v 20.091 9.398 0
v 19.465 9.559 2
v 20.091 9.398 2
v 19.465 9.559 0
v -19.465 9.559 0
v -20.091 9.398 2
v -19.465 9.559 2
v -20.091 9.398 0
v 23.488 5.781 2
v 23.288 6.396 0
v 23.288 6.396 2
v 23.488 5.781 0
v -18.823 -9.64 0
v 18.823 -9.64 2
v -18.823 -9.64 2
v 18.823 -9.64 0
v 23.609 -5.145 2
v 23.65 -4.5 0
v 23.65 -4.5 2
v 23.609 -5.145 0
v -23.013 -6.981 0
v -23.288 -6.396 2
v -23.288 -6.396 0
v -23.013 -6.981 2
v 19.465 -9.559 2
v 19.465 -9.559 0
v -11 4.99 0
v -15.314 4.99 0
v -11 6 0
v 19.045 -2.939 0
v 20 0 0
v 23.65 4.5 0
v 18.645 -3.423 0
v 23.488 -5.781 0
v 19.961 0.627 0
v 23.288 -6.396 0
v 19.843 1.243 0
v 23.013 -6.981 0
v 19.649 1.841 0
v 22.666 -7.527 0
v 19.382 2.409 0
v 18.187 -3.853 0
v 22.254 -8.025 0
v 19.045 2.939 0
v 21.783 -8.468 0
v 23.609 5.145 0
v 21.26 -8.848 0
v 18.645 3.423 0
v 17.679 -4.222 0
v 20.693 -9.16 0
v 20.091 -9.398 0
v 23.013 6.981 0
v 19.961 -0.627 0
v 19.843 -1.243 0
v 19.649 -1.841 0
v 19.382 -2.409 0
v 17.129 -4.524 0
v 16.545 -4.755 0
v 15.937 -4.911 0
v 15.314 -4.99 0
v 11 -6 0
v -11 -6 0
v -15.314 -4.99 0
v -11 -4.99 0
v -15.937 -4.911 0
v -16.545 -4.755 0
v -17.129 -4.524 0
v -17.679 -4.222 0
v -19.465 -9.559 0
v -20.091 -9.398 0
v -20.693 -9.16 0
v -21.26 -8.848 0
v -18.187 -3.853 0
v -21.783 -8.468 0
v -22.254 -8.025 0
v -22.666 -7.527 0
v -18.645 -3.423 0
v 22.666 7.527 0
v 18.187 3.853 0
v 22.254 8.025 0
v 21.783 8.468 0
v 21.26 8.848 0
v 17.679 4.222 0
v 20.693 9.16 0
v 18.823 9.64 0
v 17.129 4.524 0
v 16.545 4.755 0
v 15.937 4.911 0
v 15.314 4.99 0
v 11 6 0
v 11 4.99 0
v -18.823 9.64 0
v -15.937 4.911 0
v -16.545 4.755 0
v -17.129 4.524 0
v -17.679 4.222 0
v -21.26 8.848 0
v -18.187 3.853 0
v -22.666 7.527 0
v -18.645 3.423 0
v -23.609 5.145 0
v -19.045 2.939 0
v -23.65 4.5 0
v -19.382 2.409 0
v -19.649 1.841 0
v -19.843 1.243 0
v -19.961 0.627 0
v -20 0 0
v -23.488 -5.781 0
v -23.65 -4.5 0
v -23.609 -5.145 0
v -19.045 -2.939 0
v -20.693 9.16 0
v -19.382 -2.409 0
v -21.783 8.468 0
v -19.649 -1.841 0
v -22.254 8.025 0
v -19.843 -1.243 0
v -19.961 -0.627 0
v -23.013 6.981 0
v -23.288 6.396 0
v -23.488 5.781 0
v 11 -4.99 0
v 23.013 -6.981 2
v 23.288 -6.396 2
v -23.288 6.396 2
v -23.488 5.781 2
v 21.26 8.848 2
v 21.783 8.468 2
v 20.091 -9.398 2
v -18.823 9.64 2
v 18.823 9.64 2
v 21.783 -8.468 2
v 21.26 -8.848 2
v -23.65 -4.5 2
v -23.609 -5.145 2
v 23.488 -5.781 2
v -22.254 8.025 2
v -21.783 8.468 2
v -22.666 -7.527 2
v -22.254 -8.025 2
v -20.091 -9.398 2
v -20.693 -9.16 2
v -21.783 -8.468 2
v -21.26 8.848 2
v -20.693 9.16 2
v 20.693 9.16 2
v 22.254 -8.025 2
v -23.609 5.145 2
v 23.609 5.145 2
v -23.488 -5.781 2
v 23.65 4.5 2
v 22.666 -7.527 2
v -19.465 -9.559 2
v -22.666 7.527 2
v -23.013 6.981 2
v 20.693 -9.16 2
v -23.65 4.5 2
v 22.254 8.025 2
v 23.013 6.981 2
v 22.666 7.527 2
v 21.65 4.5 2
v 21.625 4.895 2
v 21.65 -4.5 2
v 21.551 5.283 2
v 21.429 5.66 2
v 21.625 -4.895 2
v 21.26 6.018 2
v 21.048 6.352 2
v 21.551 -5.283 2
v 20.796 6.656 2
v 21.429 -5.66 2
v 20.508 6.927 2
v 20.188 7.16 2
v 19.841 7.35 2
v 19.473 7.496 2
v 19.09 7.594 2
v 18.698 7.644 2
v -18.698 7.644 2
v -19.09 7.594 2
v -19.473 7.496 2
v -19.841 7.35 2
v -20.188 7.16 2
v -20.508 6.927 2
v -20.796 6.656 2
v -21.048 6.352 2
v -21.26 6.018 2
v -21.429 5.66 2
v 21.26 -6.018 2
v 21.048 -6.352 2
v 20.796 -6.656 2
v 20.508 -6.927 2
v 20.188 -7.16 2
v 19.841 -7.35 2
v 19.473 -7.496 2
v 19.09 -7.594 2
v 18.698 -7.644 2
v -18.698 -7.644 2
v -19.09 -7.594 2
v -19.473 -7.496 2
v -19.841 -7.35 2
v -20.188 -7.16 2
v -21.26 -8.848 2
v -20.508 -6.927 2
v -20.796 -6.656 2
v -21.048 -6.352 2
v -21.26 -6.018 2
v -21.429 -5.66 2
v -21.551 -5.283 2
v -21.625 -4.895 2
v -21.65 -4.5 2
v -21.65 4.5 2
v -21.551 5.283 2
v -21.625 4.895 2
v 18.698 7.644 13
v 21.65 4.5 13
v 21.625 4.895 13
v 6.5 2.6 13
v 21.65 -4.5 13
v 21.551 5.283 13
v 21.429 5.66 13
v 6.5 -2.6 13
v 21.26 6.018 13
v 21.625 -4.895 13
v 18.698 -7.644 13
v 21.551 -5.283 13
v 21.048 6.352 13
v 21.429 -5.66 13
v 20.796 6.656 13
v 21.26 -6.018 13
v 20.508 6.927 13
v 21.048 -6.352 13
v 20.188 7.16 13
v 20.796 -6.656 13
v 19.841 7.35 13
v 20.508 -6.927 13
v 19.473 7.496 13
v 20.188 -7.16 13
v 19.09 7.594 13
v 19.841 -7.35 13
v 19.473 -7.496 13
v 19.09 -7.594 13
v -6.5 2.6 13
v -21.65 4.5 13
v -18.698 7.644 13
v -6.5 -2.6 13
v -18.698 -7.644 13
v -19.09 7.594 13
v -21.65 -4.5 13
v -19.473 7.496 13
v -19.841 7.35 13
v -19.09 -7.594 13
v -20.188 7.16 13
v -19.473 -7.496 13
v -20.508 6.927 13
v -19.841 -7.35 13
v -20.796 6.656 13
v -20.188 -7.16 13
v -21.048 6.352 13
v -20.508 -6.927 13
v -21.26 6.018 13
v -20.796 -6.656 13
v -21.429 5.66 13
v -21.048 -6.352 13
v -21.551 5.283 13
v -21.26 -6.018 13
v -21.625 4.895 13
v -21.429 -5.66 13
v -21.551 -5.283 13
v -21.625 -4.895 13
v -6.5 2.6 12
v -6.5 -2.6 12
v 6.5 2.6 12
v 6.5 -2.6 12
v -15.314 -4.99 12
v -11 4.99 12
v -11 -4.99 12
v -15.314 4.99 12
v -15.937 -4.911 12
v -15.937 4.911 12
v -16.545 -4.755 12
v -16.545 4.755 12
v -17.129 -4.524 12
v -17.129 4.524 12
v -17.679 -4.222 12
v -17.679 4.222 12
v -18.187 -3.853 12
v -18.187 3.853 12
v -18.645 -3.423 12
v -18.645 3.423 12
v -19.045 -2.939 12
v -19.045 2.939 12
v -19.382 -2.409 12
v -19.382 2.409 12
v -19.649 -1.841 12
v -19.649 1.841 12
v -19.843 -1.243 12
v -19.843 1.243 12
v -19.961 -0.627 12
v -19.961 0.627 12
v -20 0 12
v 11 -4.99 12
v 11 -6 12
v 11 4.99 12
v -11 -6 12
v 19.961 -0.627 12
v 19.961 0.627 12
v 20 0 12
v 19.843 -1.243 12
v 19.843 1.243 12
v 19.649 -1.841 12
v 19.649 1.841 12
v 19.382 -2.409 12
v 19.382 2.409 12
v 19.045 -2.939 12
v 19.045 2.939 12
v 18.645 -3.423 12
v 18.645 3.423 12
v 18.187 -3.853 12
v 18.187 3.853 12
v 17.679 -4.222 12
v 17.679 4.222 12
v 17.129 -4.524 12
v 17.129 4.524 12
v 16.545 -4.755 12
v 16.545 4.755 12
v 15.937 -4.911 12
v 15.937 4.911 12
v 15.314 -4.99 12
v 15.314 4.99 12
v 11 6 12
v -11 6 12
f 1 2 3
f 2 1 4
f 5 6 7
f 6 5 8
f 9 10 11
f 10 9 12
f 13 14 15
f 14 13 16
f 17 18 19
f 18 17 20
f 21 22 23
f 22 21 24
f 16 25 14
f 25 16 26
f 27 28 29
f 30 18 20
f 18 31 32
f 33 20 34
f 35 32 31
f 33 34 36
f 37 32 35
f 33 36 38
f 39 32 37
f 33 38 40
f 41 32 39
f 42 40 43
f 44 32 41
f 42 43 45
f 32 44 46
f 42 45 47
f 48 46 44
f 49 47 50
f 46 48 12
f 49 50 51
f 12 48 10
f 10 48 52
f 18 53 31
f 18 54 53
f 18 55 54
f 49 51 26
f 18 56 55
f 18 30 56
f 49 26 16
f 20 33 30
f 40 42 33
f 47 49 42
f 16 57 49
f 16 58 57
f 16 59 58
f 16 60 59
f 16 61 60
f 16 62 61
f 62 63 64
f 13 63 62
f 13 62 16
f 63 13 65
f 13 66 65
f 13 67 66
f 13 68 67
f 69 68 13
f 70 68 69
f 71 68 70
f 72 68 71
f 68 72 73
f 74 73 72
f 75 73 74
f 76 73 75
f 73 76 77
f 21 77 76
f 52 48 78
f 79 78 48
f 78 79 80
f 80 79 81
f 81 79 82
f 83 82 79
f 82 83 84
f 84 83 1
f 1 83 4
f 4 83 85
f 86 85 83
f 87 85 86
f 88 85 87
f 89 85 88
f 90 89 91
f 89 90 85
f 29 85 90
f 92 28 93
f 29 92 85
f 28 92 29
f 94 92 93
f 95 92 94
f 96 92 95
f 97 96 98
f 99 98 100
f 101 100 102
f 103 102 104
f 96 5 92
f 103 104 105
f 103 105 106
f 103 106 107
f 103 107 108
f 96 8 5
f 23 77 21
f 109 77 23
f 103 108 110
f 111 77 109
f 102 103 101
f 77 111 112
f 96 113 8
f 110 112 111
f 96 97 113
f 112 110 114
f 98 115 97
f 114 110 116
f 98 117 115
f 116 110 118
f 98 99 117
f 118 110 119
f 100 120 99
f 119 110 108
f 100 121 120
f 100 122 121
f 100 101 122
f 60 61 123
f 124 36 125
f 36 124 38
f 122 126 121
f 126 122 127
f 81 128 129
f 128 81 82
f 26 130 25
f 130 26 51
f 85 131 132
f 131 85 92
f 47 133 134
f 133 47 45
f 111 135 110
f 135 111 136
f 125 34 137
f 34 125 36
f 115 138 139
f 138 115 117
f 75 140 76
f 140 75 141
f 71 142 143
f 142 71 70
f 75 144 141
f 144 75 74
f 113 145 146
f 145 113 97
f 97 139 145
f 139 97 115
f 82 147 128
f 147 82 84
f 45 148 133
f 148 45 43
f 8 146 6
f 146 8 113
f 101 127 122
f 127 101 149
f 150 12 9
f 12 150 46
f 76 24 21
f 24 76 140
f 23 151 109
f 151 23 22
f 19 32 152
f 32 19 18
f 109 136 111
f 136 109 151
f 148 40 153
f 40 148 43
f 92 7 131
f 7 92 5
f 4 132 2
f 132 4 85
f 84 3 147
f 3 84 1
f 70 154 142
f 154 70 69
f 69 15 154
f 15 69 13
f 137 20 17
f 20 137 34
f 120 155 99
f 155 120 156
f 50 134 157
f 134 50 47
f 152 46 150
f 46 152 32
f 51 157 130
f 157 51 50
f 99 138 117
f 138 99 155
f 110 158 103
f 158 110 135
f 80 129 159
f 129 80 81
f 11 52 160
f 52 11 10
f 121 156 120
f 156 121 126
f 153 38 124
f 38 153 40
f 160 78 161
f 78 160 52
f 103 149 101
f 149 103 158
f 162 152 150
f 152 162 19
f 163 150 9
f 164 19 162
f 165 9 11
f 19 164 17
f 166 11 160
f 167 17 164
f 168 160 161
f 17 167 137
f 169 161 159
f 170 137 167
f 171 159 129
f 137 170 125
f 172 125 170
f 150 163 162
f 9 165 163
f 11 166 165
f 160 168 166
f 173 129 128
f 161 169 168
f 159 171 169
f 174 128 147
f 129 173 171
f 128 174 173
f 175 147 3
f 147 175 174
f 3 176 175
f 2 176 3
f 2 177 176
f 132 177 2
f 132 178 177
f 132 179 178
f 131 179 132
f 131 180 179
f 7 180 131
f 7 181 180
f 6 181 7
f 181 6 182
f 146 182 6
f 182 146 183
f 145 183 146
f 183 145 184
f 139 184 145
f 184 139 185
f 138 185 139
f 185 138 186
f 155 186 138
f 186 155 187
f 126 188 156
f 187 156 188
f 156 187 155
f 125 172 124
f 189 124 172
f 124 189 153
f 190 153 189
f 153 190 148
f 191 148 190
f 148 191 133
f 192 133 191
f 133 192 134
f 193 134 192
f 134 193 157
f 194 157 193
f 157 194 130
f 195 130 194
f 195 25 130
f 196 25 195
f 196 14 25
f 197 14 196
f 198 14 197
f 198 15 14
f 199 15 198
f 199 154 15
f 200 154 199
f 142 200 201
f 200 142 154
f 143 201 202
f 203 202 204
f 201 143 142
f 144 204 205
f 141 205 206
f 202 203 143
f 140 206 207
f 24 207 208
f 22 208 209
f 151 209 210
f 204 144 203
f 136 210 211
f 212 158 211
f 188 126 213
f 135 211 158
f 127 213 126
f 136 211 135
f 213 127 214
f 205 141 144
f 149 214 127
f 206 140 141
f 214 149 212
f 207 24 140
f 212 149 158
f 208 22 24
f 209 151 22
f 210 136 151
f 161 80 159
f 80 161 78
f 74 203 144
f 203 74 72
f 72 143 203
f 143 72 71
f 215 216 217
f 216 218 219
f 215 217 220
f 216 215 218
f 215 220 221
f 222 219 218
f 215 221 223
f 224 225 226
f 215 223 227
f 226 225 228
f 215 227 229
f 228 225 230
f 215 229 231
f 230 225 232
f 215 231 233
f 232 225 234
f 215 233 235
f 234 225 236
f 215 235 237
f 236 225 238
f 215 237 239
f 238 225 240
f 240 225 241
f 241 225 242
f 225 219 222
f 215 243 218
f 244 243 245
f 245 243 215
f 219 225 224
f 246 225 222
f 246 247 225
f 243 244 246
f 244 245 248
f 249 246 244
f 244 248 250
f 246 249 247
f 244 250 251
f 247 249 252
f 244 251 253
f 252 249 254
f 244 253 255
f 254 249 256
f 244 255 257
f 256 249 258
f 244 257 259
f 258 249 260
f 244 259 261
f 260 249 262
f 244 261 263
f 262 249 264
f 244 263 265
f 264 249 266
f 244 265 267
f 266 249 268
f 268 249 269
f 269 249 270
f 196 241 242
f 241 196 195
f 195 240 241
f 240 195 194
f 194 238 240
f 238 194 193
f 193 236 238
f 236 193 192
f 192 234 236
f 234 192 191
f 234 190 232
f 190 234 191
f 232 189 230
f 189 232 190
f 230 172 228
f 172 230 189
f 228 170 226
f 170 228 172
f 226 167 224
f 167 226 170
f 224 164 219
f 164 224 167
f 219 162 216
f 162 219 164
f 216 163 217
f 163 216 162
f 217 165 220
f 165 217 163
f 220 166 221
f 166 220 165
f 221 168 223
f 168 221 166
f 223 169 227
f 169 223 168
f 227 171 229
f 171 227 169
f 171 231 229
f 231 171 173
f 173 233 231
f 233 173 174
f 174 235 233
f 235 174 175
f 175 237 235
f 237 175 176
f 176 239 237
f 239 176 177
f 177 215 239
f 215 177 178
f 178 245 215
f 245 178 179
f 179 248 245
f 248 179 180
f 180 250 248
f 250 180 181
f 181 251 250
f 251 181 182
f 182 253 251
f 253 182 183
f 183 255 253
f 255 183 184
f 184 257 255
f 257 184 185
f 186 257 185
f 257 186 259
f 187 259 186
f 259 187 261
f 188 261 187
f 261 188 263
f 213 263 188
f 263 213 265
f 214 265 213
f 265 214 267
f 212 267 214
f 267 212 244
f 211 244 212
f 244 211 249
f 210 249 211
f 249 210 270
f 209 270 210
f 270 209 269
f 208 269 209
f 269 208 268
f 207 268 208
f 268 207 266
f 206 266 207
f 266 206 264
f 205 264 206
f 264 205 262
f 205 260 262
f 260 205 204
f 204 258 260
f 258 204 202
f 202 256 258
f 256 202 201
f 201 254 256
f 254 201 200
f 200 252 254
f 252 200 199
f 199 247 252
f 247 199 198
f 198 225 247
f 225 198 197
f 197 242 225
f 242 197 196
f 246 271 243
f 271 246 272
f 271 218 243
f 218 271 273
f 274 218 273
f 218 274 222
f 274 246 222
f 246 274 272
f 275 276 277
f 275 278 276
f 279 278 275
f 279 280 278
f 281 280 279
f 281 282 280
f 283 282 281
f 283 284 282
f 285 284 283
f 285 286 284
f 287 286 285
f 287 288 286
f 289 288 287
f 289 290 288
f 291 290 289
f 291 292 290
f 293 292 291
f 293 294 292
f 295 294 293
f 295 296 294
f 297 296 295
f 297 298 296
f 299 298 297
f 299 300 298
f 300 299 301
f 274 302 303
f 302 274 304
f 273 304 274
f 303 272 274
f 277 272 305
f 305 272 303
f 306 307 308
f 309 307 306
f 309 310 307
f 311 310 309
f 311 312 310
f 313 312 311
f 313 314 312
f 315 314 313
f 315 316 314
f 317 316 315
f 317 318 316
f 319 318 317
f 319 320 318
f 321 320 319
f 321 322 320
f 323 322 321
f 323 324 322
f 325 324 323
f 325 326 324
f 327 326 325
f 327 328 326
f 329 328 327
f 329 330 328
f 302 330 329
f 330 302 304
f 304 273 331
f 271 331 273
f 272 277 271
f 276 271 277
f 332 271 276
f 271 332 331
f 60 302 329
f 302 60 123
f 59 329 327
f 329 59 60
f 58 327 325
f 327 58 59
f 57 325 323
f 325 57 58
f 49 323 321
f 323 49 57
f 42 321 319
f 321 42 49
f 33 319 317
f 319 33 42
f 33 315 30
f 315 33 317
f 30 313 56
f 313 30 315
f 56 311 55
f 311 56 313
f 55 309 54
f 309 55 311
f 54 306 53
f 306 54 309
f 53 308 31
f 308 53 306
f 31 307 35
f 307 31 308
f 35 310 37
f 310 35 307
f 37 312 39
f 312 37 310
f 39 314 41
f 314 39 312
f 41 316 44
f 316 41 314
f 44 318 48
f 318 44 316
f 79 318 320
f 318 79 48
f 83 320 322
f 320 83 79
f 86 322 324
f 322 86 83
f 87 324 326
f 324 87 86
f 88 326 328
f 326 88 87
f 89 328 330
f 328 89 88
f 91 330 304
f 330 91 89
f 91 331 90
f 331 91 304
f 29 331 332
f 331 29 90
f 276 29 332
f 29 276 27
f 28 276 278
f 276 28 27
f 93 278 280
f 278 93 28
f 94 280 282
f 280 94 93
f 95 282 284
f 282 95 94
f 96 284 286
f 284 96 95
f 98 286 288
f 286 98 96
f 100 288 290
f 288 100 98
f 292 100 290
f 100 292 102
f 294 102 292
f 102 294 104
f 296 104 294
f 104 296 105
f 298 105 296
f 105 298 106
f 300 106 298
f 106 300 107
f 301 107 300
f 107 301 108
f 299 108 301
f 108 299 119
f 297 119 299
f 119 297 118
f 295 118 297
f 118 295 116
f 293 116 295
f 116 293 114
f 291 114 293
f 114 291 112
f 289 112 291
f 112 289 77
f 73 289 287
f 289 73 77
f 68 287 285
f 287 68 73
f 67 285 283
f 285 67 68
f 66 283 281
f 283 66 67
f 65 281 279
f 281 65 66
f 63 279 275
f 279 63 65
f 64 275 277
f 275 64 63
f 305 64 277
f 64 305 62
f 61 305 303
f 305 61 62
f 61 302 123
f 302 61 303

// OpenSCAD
$fn = 50;

thickness = 2;
circle_d = 6.3;
size = [39.3+2*thickness-circle_d, 11.3+2*thickness-circle_d];
height=11;
hole_size = [13, 5.2];

difference() {
    union() {
        #linear_extrude(height=2)
        body(size, circle_d+4);
        translate([0, 0, 2]) 
        linear_extrude(height=height)
            difference() {
            body(size, circle_d);
            square(hole_size, center=true);
        }
    };
    linear_extrude(height=height+1) {
        hull() {
            translate([-30/2, 0])
            circle(d=10);
            translate([30/2, 0])
            circle(d=10);
        };
        
        square([22, 12], center=true);
    }
};

module body(size, circle_d) {
    minkowski() {
        circle(d=circle_d);
        square([size.x, size.y], center=true);
    }
}
